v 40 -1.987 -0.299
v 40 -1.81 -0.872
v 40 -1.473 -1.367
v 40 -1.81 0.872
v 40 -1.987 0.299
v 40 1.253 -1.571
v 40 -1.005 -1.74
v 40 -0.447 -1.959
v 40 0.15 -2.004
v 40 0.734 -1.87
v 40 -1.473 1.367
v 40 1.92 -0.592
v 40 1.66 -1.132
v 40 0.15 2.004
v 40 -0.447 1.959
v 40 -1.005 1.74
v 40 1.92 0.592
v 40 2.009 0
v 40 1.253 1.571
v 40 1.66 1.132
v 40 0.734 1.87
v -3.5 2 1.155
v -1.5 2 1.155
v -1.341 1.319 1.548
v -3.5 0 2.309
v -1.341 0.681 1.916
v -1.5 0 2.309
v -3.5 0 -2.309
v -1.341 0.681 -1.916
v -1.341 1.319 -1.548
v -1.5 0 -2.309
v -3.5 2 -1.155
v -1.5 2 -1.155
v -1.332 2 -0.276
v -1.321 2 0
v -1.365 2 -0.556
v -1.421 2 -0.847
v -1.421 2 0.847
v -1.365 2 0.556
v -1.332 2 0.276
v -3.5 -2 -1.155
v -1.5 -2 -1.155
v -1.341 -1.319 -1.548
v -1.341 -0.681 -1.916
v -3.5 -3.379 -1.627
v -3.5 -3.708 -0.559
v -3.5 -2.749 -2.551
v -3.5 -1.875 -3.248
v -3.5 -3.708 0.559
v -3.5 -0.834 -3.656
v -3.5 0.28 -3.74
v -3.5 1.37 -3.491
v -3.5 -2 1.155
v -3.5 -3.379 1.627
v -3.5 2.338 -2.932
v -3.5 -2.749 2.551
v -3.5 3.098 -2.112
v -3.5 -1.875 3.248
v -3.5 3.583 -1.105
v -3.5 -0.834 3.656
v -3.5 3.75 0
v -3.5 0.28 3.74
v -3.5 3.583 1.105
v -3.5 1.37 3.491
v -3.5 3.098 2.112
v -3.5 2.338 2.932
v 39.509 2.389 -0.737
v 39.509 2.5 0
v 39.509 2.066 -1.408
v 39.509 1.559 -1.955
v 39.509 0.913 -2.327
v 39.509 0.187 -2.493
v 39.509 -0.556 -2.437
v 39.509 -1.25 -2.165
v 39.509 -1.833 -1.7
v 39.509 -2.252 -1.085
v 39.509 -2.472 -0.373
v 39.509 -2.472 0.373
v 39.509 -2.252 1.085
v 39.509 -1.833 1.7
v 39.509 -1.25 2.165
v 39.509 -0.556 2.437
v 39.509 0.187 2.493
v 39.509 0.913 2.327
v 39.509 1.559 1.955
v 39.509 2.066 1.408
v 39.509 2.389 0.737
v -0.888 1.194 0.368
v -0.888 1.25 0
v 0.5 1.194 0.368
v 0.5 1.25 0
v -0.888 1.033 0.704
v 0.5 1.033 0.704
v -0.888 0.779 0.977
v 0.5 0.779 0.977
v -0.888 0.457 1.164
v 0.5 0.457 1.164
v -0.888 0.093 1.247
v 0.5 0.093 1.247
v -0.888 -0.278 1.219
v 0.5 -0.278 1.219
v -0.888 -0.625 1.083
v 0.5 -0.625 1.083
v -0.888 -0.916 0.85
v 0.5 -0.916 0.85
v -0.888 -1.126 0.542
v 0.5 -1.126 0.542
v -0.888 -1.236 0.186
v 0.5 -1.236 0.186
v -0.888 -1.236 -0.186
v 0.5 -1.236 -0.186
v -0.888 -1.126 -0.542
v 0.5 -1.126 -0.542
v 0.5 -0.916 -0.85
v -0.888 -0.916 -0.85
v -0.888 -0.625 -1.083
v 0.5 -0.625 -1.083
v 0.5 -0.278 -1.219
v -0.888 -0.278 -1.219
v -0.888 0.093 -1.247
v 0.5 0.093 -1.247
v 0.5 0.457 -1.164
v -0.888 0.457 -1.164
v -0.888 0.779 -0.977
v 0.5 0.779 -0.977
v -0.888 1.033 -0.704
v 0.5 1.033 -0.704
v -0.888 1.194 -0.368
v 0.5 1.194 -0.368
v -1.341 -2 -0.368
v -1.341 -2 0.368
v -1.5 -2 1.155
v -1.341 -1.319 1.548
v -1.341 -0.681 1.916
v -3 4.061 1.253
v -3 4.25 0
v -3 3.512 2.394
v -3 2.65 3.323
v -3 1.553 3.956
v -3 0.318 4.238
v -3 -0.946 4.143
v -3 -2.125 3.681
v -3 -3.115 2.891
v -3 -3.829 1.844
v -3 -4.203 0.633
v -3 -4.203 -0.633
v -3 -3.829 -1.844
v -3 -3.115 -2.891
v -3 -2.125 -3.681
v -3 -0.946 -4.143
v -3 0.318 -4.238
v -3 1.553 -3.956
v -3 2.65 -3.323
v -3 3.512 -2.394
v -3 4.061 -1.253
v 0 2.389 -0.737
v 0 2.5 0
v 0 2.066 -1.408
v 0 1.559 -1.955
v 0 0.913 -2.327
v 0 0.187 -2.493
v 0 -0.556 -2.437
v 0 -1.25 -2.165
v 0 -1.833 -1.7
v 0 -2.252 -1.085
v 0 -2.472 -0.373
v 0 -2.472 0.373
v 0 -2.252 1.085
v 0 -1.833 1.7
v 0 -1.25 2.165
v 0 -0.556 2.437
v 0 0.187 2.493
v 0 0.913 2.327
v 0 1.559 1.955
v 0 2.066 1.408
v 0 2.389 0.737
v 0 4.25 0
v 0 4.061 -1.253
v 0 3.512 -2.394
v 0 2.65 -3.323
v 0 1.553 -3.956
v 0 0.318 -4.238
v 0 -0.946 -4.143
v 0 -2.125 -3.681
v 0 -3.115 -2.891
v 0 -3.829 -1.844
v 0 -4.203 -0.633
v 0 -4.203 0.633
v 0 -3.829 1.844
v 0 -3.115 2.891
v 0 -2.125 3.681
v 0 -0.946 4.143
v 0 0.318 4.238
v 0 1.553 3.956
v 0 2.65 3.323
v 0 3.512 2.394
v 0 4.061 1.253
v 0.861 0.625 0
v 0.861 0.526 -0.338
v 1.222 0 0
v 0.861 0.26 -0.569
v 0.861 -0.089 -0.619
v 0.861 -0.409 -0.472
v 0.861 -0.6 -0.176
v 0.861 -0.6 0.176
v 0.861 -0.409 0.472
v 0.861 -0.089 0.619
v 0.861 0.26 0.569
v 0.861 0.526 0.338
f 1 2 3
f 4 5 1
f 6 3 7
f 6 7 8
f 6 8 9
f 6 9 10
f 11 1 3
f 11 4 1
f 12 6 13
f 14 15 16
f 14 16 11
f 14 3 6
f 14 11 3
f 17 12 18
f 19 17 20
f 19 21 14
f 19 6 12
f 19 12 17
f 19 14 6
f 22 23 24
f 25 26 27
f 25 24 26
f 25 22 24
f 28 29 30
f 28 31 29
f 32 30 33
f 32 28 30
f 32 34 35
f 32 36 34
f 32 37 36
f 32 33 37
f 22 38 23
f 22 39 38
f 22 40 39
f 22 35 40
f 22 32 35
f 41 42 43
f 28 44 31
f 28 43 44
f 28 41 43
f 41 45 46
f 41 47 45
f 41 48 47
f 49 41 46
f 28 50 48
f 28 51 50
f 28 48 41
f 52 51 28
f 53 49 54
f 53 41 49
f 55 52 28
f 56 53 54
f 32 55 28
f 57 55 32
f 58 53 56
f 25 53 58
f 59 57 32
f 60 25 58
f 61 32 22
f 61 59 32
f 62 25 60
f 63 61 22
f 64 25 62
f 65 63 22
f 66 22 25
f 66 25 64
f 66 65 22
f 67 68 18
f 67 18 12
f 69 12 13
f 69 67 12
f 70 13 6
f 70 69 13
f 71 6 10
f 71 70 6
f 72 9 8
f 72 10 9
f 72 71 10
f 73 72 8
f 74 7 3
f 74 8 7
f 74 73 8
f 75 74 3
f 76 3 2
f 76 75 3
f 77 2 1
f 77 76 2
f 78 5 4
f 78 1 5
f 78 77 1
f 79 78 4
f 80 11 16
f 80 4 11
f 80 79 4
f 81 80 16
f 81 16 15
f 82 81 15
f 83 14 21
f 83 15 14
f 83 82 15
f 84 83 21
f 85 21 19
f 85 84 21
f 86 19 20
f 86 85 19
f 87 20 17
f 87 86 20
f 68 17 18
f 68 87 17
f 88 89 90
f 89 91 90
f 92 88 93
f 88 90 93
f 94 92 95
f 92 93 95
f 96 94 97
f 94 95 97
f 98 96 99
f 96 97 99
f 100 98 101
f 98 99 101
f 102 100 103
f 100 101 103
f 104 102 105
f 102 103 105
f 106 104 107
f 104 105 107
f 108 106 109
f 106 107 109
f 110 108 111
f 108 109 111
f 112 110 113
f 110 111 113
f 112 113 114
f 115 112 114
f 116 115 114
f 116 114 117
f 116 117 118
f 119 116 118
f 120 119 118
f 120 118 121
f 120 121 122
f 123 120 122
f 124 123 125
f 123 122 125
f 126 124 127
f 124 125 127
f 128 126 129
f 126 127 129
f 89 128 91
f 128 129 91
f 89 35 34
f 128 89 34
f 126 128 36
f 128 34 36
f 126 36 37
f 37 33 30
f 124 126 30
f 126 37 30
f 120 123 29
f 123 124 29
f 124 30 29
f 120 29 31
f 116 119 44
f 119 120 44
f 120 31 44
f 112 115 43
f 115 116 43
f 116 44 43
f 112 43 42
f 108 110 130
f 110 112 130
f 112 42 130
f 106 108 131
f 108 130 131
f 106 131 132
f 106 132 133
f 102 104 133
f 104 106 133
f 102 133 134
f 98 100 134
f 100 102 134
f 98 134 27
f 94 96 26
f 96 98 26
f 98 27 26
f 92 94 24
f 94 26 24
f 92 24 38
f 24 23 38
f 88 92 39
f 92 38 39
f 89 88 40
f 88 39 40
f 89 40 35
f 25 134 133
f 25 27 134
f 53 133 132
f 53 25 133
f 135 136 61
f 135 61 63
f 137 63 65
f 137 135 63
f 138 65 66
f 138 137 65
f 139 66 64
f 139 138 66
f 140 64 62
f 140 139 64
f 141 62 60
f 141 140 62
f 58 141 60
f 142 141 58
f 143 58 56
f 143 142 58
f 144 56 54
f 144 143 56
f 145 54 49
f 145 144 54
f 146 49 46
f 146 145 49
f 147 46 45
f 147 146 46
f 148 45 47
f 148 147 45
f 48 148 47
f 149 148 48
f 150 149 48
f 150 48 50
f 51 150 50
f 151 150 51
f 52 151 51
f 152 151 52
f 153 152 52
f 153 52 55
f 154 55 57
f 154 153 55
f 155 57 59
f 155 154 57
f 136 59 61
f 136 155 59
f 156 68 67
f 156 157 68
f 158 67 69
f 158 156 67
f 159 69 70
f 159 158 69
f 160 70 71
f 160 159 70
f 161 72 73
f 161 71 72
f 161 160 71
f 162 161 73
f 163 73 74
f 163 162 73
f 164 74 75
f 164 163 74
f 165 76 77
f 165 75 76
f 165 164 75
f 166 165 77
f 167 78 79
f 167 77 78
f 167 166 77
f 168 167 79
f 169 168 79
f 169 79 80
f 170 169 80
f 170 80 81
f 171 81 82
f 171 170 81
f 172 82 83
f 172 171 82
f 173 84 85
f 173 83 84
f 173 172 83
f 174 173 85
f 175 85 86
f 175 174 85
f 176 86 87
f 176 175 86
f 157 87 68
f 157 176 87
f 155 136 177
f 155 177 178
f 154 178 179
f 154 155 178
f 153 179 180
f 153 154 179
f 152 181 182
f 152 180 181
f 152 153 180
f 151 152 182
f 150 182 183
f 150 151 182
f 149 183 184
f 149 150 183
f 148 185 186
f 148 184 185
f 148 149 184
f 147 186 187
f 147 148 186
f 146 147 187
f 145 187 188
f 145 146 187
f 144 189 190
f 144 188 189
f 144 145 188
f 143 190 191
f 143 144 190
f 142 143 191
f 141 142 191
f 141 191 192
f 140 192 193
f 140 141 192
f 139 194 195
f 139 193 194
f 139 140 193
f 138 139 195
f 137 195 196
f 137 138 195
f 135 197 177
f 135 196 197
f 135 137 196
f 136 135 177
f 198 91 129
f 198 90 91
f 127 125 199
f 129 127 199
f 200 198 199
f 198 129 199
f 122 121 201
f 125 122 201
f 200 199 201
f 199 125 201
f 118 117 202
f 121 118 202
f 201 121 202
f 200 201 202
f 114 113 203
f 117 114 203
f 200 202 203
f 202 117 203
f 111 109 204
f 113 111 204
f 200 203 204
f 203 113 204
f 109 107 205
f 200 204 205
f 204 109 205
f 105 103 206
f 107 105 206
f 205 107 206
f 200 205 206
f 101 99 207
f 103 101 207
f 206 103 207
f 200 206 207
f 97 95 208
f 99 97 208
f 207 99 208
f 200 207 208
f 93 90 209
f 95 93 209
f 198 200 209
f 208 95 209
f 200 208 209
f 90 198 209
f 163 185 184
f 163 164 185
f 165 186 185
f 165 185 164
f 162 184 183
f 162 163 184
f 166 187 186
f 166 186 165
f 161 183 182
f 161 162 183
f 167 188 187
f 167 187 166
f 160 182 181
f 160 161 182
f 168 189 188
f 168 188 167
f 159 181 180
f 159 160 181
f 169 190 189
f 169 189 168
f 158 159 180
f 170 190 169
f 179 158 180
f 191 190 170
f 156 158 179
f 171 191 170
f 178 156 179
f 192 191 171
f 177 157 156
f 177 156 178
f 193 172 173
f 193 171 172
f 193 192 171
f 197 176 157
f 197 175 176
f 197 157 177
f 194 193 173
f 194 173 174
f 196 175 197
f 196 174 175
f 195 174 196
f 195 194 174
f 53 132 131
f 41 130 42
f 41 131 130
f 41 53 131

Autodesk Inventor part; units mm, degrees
ref_plane "YZ Plane" through (0, 0, 0) normal (1, 0, 0) x (0, 1, 0)
ref_plane "XZ Plane" through (0, 0, 0) normal (0, 1, 0) x (-1, 0, 0)
sketch "Esquisse1" plane through (0, 0, 0) normal (0, 0, 1) x (1, 0, 0)
  line L0 (1.2217, 0) -> (40, 0)
  line L1 (40, 0) -> (40, 2.5)
  line L2 (40, 2.5) -> (0, 2.5)
  line L3 (0, 2.5) -> (0, 4.25)
  line L4 (0, 4.25) -> (-3.5, 4.25)
  line L5 (-3.5, 4.25) -> (-3.5, 2.3094)
  line L6 (-3.5, 2.3094) -> (-1.5, 2.3094)
  line L7 (-1.5, 2.3094) -> (-0.8884, 1.25)
  line L8 (-12.2, 0) -> (48.7, 0) projected
  line L9 (0, -0.85) -> (0, 5.1) projected
  line L10 (-0.8884, 1.25) -> (0.5, 1.25)
  line L11 (0.5, 1.25) -> (1.2217, 0)
  line L12 (-3.5, 2.3094) -> (-3.5, 0) construction
  line L13 (-3.5, 3.75) -> (-3, 4.25)
  dimension "d0" = 3.5
  dimension "d1" = 2
  dimension "d2" = 60
  dimension "d3" = 5
  dimension "d4" = 4.6188
  dimension "d5" = 8.5
  dimension "d15" = 4
  dimension "d16" = 2.5
  dimension "d17" = 40
  dimension "d32" = 45
  dimension "d33" = 0.5
revolve "Corps" add sketch "Esquisse1" angle 360 about axis through (1.2217, 0, 0) along (1, 0, 0) contours L11 L10 L9 L2 L1 L0 | L10 L7 L6 L5 L13 L4 L3 L9 | L13 L5 L4
revolve "Chanfrein2" cut sketch "Esquisse1" angle 360 about axis through (-10, 0, 0) along (1, 0, 0) contours L13 L5 L4
sketch "Esquisse2" plane through (-3.5, 0, 0) normal (-1, 0, 0) x (0, 0, 1)
  circle A0 centre (0, 0) radius 2.3094 projected
  line L0 (0, -5.95) -> (0, 5.95) projected
  line L1 (-5.95, 0) -> (5.95, 0) projected
  line L2 (2.3094, 0) -> (1.1547, -2)
  line L3 (1.1547, -2) -> (-1.1547, -2)
  line L4 (-1.1547, -2) -> (-2.3094, 0)
  line L5 (-2.3094, 0) -> (-1.1547, 2)
  line L6 (-1.1547, 2) -> (1.1547, 2)
  line L7 (1.1547, 2) -> (2.3094, 0)
extrude "Rainure" add sketch "Esquisse2" against normal up to next contours L7 A0 | A0 L2 | L6 L0 A0 | A0 L0 L3 | L0 L6 A0 | A0 L3 L0 | L4 A0 | A0 L5
thread "Filetage" size "M5x0.8" class "6g" standard "ISO Metric profile" length 16
chamfer "Chanfrein1" distance 0.4908 distance2 0.4908 1 edges at (40, -2.5, 0) measured on face at (40, 0.9945, 0.5526)
ref_plane "Work Plane1" through (20, 0, 0) normal (0, 0.5, 0.866) x (1, 0, 0)
equation "\"d0\" = KOH"
equation "\"d1\" = INTI"
equation "\"d3\" = GD"
equation "\"d4\" = 1.1547 * SW"
equation "\"d5\" = KOD"
equation "\"d15\" = INFT"
equation "\"d16\" = SDT"
equation "\"d17\" = NLG"
equation "\"d33\" = Cham"
equation "\"d7\" = GEL"
equation "\"d9\" = -0.5 * SPD + 0.5 * GD"
equation "\"d12\" = GUL"
equation "\"GD\" = NND"
equation "\"NLG\" = 40"
equation "\"GEL\" = 16"
equation "\"KOD\" = 8.5"
equation "\"KOH\" = 3.5"
equation "\"GUL\" = 0.61345 * PTC"
equation "\"SW\" = 4"
equation "\"INTI\" = 2"
equation "\"SPD\" = NND - 1.2269 * PTC"
equation "\"SDT\" = 2.5"
equation "\"INFT\" = 4"
equation "\"Cham\" = 0.5"
equation "\"TOA\" = 30deg"
equation "\"GD1\" = THREADDIA - 1.2269 * PTC"
equation "\"THREADDIA\" = 5"
equation "\"BDM\" = NND"
equation "\"FAWI\" = 45deg"
equation "\"RR\" = 0.1 * NND"
equation "\"PTC\" = 0.8"
equation "\"NND\" = 5"
equation "\"FAWI1\" = 45deg"
equation "\"GAL\" = 0.61345 * PTC"
equation "\"E0\" = 1.155 * SW"
properties part number "DIN 6912 - M5 x 40" material "Acier, doux"
